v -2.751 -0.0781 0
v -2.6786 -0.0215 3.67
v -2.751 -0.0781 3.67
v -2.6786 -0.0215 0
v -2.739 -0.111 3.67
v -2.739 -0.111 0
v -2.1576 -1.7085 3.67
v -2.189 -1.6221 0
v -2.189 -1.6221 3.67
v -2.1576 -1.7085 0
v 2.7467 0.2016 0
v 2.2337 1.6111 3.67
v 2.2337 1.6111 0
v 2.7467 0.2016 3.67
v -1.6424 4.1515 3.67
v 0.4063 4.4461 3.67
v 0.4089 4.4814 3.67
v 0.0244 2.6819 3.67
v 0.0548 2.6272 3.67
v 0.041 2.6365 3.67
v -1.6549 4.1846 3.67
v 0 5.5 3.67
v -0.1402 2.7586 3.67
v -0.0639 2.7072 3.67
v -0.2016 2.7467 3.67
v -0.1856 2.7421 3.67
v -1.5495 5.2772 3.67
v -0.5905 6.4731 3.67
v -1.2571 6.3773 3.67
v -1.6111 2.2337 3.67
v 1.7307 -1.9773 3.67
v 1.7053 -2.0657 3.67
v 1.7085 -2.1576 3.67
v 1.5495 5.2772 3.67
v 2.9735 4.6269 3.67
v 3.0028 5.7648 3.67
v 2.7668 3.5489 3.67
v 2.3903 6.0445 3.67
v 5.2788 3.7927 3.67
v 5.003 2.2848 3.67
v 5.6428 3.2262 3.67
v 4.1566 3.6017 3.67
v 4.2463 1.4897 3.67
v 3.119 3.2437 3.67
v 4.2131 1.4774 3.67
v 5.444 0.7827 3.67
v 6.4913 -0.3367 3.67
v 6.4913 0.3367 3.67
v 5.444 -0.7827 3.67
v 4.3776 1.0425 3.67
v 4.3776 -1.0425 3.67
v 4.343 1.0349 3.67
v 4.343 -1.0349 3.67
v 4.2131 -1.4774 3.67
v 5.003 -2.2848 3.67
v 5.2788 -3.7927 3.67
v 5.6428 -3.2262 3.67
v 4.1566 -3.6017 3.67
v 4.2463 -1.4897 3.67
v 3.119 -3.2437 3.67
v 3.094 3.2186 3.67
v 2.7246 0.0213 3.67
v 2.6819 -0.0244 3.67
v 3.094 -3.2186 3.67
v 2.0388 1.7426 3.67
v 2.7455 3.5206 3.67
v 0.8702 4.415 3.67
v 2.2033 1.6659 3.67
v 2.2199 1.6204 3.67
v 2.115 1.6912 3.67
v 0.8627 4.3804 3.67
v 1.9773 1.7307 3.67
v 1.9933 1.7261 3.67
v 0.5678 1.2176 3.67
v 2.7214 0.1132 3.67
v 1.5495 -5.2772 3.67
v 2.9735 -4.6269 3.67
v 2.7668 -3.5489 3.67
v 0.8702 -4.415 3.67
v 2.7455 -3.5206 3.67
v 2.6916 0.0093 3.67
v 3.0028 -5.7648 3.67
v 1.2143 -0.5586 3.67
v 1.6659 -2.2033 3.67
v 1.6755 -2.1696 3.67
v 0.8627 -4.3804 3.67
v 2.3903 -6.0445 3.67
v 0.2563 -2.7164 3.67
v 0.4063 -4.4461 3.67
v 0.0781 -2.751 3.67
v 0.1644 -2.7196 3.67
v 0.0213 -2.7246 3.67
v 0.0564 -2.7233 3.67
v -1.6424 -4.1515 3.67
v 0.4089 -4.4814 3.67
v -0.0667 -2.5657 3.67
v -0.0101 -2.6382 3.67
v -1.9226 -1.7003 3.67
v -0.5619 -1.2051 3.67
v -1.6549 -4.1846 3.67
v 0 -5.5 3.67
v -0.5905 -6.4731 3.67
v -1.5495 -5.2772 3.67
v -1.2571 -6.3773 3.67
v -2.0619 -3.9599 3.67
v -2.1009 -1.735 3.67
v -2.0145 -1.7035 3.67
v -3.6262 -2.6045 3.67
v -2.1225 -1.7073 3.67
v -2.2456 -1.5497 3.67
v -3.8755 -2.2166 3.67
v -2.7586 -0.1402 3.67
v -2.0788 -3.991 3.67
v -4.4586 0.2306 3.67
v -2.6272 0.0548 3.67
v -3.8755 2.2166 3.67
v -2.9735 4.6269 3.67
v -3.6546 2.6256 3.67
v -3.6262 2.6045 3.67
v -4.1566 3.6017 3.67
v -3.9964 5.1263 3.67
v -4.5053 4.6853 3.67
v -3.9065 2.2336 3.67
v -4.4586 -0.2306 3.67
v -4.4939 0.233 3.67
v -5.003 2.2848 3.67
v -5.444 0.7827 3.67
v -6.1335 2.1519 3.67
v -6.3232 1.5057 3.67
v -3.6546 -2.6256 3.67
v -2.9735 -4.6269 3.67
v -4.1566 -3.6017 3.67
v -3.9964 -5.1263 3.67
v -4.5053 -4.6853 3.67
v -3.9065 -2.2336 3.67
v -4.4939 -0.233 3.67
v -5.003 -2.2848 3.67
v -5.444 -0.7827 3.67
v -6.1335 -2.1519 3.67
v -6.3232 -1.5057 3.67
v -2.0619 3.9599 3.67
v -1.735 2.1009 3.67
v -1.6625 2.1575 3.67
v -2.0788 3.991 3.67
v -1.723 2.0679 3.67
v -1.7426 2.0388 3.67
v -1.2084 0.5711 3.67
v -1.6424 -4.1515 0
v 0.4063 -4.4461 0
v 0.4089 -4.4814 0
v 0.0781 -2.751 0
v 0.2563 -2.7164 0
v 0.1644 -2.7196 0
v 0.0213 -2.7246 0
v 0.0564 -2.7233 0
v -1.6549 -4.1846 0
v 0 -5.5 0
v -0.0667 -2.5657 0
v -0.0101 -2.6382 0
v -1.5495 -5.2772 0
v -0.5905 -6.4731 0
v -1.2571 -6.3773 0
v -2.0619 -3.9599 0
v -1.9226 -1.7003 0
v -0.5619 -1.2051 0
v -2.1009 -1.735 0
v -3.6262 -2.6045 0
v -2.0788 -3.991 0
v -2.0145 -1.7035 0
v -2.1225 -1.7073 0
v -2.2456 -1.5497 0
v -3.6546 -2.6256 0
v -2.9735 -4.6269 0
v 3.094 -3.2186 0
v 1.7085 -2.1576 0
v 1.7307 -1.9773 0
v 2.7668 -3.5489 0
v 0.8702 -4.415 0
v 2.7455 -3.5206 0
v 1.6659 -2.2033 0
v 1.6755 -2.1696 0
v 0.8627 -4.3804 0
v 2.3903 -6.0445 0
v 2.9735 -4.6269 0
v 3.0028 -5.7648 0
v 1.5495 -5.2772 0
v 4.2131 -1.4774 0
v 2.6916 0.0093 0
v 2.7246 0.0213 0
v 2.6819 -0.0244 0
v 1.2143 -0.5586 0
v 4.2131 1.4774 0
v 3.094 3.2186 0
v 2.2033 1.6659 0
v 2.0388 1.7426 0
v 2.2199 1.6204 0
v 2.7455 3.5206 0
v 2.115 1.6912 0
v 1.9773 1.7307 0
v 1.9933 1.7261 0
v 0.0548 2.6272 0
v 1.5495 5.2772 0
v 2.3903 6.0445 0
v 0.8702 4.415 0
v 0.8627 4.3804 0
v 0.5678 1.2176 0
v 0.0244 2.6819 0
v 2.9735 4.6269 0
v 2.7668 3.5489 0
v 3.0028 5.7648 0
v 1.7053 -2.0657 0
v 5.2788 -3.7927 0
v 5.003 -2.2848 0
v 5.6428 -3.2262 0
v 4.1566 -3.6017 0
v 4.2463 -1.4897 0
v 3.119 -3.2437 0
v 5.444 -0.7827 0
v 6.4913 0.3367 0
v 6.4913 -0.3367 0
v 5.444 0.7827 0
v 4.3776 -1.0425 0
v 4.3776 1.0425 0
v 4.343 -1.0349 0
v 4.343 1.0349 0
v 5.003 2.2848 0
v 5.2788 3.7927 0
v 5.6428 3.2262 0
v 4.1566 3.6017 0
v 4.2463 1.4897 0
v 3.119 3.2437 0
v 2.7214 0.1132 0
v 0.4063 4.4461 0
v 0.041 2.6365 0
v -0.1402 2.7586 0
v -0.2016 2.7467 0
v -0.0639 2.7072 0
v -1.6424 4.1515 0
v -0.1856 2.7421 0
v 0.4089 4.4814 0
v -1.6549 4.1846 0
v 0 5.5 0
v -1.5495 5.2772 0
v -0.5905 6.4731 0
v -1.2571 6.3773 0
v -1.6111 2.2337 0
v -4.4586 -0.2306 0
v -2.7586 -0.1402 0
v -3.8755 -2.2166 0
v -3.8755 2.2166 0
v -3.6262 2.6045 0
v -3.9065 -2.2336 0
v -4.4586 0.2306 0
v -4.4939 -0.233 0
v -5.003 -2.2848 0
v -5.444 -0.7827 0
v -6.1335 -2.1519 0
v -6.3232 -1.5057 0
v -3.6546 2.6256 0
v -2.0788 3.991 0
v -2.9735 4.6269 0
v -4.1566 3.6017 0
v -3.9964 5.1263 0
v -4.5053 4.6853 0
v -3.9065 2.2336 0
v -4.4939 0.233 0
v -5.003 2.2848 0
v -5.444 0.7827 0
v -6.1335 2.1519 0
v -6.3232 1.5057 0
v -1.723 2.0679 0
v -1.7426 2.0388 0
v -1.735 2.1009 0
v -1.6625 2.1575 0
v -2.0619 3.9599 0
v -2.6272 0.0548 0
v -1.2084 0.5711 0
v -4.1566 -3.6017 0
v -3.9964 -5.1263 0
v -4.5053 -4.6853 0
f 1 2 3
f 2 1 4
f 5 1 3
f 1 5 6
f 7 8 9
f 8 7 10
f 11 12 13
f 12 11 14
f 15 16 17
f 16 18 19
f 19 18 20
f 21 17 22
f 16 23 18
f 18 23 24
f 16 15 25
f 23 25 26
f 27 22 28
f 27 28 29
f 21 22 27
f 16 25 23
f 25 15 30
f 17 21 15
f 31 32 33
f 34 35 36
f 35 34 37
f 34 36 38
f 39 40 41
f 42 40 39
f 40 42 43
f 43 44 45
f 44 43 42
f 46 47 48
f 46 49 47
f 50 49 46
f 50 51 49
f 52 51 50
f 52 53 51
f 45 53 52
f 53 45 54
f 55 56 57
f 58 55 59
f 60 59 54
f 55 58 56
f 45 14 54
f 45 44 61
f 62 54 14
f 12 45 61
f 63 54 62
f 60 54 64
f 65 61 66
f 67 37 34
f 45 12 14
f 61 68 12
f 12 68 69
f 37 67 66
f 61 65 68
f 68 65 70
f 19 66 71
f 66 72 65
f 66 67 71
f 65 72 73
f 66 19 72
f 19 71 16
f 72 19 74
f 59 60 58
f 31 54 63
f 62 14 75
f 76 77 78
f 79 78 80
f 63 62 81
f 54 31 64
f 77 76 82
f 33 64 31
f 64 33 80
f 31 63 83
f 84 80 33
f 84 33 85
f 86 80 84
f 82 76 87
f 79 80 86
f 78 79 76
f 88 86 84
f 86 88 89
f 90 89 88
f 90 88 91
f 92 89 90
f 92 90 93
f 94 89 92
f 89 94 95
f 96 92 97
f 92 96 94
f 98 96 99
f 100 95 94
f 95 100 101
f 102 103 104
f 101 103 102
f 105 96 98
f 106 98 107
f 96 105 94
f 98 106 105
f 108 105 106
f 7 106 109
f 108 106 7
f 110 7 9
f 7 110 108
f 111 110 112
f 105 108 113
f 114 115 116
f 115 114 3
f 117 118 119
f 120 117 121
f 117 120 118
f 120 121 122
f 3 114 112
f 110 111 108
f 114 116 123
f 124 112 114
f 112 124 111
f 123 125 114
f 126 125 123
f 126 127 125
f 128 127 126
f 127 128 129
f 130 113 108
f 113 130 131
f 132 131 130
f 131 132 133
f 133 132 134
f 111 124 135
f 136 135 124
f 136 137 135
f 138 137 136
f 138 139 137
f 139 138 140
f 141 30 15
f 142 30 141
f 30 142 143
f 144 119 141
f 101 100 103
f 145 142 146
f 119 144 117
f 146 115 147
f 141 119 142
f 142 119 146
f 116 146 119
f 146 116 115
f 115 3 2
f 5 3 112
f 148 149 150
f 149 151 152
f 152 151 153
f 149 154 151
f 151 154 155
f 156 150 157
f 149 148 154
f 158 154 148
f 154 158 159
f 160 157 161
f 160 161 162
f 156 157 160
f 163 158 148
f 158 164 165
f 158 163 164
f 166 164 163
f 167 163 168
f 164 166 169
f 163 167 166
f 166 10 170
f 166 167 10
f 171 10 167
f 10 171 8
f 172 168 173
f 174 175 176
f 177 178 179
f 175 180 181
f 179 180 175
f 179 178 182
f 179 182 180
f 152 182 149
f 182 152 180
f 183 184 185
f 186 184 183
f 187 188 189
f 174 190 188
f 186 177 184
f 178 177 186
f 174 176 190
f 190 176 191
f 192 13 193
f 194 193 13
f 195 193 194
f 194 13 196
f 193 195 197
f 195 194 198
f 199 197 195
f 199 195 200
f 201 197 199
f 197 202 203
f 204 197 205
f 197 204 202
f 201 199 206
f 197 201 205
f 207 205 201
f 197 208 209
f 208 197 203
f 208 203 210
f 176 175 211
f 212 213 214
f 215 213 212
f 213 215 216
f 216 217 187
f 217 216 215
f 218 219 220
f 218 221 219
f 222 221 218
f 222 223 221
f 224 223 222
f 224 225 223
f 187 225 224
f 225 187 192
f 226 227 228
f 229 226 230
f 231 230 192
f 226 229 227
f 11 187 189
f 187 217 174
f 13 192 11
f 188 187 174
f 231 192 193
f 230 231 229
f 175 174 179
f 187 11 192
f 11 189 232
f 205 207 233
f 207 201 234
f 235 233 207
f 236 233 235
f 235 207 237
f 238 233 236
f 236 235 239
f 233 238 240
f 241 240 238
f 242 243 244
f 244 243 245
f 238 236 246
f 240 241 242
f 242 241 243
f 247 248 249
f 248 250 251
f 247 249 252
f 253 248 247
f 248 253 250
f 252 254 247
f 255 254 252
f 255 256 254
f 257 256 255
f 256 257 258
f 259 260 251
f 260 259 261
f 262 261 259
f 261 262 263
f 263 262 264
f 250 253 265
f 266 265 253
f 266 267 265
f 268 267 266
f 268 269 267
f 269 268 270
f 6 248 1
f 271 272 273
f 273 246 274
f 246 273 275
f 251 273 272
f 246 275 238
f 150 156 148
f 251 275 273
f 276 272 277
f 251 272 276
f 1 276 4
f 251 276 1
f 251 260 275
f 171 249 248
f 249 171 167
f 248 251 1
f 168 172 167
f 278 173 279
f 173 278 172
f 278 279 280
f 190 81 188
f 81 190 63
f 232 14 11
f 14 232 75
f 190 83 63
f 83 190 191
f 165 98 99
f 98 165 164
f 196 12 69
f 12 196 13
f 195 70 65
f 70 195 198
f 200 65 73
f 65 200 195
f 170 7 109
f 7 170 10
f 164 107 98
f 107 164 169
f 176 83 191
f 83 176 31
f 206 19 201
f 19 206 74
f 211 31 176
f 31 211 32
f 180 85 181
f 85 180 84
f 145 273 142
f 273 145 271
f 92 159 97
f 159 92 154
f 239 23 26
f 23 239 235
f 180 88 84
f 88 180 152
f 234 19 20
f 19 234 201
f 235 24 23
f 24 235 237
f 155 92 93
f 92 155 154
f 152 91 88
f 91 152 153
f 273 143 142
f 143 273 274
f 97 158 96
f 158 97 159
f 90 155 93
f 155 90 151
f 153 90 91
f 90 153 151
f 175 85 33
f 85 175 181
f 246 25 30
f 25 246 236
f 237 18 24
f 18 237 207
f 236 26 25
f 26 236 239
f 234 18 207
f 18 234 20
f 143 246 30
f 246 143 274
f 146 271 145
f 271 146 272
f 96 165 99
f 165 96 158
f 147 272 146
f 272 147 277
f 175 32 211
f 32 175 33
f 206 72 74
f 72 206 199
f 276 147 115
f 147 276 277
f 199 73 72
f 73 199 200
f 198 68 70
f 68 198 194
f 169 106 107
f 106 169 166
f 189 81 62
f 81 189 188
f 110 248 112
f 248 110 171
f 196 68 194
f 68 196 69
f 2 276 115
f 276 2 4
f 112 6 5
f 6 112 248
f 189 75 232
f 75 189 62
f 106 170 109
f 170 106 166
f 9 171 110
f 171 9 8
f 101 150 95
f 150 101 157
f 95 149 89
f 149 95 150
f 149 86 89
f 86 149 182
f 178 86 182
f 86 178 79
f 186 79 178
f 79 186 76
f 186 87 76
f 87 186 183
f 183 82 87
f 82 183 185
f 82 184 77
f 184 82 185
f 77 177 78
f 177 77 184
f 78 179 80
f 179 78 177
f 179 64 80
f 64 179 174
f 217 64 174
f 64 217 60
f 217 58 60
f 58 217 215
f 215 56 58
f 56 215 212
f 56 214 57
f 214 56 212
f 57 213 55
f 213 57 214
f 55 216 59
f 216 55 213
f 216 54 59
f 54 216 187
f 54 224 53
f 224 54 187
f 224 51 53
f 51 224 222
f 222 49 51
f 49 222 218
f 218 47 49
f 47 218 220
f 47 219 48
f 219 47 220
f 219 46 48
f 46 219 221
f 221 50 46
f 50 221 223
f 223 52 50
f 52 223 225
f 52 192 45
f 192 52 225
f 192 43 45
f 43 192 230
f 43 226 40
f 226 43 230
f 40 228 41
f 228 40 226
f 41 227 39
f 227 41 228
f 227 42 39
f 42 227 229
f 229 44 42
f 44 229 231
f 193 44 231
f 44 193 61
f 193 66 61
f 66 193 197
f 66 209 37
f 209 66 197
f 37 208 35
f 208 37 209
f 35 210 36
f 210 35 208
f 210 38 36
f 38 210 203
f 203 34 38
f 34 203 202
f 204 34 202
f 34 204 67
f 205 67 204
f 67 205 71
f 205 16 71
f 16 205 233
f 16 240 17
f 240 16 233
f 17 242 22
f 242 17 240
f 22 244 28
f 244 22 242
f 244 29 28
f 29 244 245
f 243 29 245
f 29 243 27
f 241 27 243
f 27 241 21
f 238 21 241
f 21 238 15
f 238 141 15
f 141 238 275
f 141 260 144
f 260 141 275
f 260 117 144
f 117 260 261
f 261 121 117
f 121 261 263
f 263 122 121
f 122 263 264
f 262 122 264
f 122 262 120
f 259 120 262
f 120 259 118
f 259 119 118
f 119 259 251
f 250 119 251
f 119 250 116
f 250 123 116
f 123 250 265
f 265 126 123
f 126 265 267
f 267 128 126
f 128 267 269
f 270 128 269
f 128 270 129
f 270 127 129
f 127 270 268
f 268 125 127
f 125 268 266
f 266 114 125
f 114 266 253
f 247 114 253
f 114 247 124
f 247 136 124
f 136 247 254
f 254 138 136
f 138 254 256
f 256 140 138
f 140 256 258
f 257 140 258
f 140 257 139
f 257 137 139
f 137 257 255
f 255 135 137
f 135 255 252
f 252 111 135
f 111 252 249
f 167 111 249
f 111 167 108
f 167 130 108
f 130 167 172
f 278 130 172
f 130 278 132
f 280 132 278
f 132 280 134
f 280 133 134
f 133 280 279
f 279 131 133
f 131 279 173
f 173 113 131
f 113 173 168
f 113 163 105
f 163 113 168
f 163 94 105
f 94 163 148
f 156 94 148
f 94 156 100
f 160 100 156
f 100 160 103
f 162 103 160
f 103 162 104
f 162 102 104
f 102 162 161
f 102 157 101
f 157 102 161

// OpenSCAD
// Alorithmic LEGO(r) Technic compatible gear generator
//
// NOTE regarding Patents: Since 1977 the LEGO Group has produced "Technic"
// elements with gear teeth, axles, axle-holes, and other features closely
// resembling the design(s) in this file, as part of their "Expert Builder"
// and "Technical Sets", now called "Technic" (see for example set 961,
// peeron.com/inv/sets/961-1?showpic=9288 ). By 1989 they had added pieces
// with rounded ends (see peeron.com/inv/sets/5264-1?showpic=8542 (set 5264
// from 1987) and peeron.com/inv/sets/5110-2?showpic=8543 (set 5110 from 1989))
// The object(s) produced by this SCAD file are different from real LEGO(r)
// elements, and any similarities of features, such as the shapes of axles
// and axle-holes, are functional in nature. The functions in question
// resemble those in LEGO patents that have already expired (or, if not
// patented, became prior art when the product(s) became available for
// purchase, i.e. 1989 at the latest). Nevertheless, one must not infringe
// on non-expired patents and any non-patent rights, such as LEGO(r)
// trademarks and brand identity. An example of such infringement would be
// to make objects and then try to "pass them off" as LEGO products. See
// for example the Kirkbi AG v. Ritvik Holdings Inc. case, (Supreme Court of
// Canada [2005] 3 S.C.R. 302).
//
// This was originally created by user bjepson on Thingiverse (thing 29989),
// then heavily modified and expanded by Robert Munafo:
//  20121226: separate parameters for rows/columns of cylinder holes and of
//            "plus-shaped" holes
//          * Rotate the holes by 20 degrees to take advantage of
//            edge dithering both for improved hole width resolution
//            and to provide a rough surface which better grips the
//            smooth axles.
//          * You can now get more than just a single row of plus-holes
//            in each direction
//
//  20130105: added MCAD functions to make this file work all by itself (no
//            need to hunt down missing pieces elsewhere)
//          * More accurate axle hole dimensions
//          * Round holes are actually round now (imagine that!)
//          * Automatically determines correct parameters for number and placement
//            of holes, based on number of teeth
//
//  20130106: fix small glitch seen at junction of fillet and bottom land (for
//            illustration of the problem, see "0106-fix.jpg" at
//            thingiverse.com/thing:40410)

// 32 teeth is the real "missing" gear size, because all the other
// multiples of 8 are available. An argument can also be made for 28 (which
// however is available in the new small turntable) or any other multiple of 4
// because the official gears are all multiples of 4, namely: 8, 12, 16,
// 20, 24, 28(turntable), 36, 40 and 56(big turntable).
//
// For my orrery designs ( see mrob.com/orrery ) I might use any integer
// number of teeth from 8 up to around 60 or 70.
//
// The holes parameters need to be chosen a certain way. To get a normal style
// gear with a + hole in the middle, the plus_row and plus_col should both
// be odd, and the holes_row, holes_col should both be even. To get a round
// hole in the center, do it the other way 'round. Then invoke it as
// myGearParamed(n_teeth, holes_row, holes_col, plus_row, plus_col)
//
// Examples:
//          my 20 gear: holes_row=2, holes_col=2, plus_row=1, plus_col=1
//    Standard 24 gear: holes_row=2, holes_col=2, plus_row=1, plus_col=1
//          my 28 gear: holes_row=2, holes_col=2, plus_row=3, plus_col=1
//          my 32 gear: holes_row=2, holes_col=2, plus_row=3, plus_col=3
// nonstandard 36 gear: holes_row=2, holes_col=2, plus_row=3, plus_col=3
//    Standard 40 gear: holes_row=4, holes_col=2, plus_row=3, plus_col=3
//          my 44 gear: holes_row=4, holes_col=2, plus_row=3, plus_col=3
//          my 48 gear: holes_row=4, holes_col=4, plus_row=5, plus_col=3
//
// By default, the myGear function chooses the best values for all the holes paramters
// based on the number of teeth.

// As an example, make one gear.
myGear(11);

module myGear(n_teeth) {
  if (n_teeth >= 56) {
    myGearParamed(n_teeth, 6, 4, 5, 5);
  } else if (n_teeth >= 48) {
    myGearParamed(n_teeth, 4, 4, 5, 3);
  } else if (n_teeth >= 40) {
    myGearParamed(n_teeth, 4, 2, 3, 3);
  } else if (n_teeth >= 32) {
    myGearParamed(n_teeth, 2, 2, 3, 3);
  } else if (n_teeth >= 26) {
    myGearParamed(n_teeth, 2, 2, 3, 1);
  } else if (n_teeth >= 21) {
    myGearParamed(n_teeth, 2, 2, 1, 1);
  } else {
    myGearParamed(n_teeth, 0, 0, 1, 1);
  }
}

module myGearParamed(num_teeth, holes_row, holes_col, plus_row, plus_col)
{
  jaggy_angle = 20;
  beam_width = 7.8;  // Needs to be a bit less than the LEGO stud spacing = 7.99 mm
  gearHeight = 3.67;

  axle_gap = 1.9;   // axle thickness is actually about 1.8 mm
  hole_radius = 2.65;

  difference() {
    linear_extrude(height = gearHeight, center = false, convexity = 10, twist = 0) {
      gear(number_of_teeth=num_teeth,
        diametral_pitch=1, 
        pressure_angle=88, 
        clearance = 0);
    }

    // We do two rectangular grids of holes, rotate 90 degrees and do them
    // again.
    for (i = [jaggy_angle, jaggy_angle+90]) {
      rotate([0,0,i]) {
        // Cut the cross-axle holes (8.0mm = stud spacing)
        if (plus_row > 0) {
          for (x=[-4 * (plus_row - 1 ): 8.0 : 4 * (plus_row -1 )]) {
            for (y=[-4 * (plus_col - 1 ): 8.0 : 4 * (plus_col -1)]) {
              translate([x - hole_radius, y - axle_gap/2, 0])
                #roundedRect([hole_radius * 2, axle_gap, gearHeight], .2);
              translate([x - axle_gap/2, y - hole_radius, 0])
                #roundedRect([axle_gap, hole_radius * 2, gearHeight], .2);
            }
          }
        }

        if (holes_row > 0) {
          // Cut the round holes
          for (x=[-4 * (holes_row-1) : 8.0 : 4 * (holes_row-1)]) {
            for (y=[-4 * (holes_col-1) : 8.0 : 4 * (holes_col-1)]) {
              translate([x, y, 0]) {
                #cylinder(r=hole_radius, h = gearHeight, $fs=0.5);
              }
            }
          }
        }

      }
    }

  }
}


// ---------------------------------------------------------------------------------
//
// module for rounded rectangles by tlrobinson on Thingiverse in a 
// comment posted to http://www.thingiverse.com/thing:9347 on March
// 29, 2012, 3:57:46 AM EDT
//
module roundedRect(size, radius) {  
  x = size[0];  
  y = size[1];  
  z = size[2];  
 
  linear_extrude(height=z)  
  hull() {  
    translate([radius, radius, 0])  
      circle(r=radius);  
 
    translate([x - radius, radius, 0])  
      circle(r=radius);  
 
    translate([x - radius, y - radius, 0])  
      circle(r=radius);  
 
    translate([radius, y - radius, 0])  
      circle(r=radius);  
  }  
}


// ---------------------------------------------------------------------------------
//
// The following functions (gear, involute_gear_tooth and two minor functions)
// are taken from the "gears.scad" file in the "MCAD" package, which is available
// at https://github.com/D1plo1d/MCAD

// Geometry Sources:
//  http://www.cartertools.com/involute.html
//  gears.py (inkscape extension: /usr/share/inkscape/extensions/gears.py)
// Usage:
//  Diametral pitch: Number of teeth per unit length.
//  Circular pitch: Length of the arc from one tooth to the next
//  Clearance: Radial distance between top of tooth on one gear to bottom of gap on another.

module gear(number_of_teeth,
    circular_pitch=false, diametral_pitch=false,
    pressure_angle=20, clearance = 0)
{
  if (circular_pitch==false && diametral_pitch==false) echo("MCAD ERROR: gear module needs either a diametral_pitch or circular_pitch");
  
  //Convert diametrial pitch to our native circular pitch
  circular_pitch = (circular_pitch!=false?circular_pitch:180/diametral_pitch);
  
  // Pitch diameter: Diameter of pitch circle.
  pitch_diameter  =  number_of_teeth * circular_pitch / 180;
  pitch_radius = pitch_diameter/2;
  
  // Base Circle
  base_diameter = pitch_diameter*cos(pressure_angle);
  base_radius = base_diameter/2;

  // Diametrial pitch: Number of teeth per unit length.
  pitch_diametrial = number_of_teeth / pitch_diameter;

  // Addendum: Radial distance from pitch circle to outside circle.
  addendum = 1/pitch_diametrial;
  
  //Outer Circle
  outer_radius = pitch_radius+addendum;
  outer_diameter = outer_radius*2;
  
  // Dedendum: Radial distance from pitch circle to root diameter
  dedendum = addendum + clearance;

  // Root diameter: Diameter of bottom of tooth spaces.
  root_radius = pitch_radius-dedendum;
  root_diameter = root_radius * 2;
  
  half_thick_angle = 360 / (4 * number_of_teeth);
  
  union() {
    rotate(half_thick_angle)
      circle($fn=number_of_teeth*2, r=root_radius*1.001);
    
    for (i= [1:number_of_teeth]) {  //for (i = [0])
      rotate([0,0,i*360/number_of_teeth]) {
        involute_gear_tooth(
          pitch_radius = pitch_radius,
          root_radius = root_radius,
          base_radius = base_radius,
          outer_radius = outer_radius,
          half_thick_angle = half_thick_angle);
      } // end of rotate(){}
    } // end of for(){}
  } // end of union(){}
} // end of module gear

module involute_gear_tooth(
          pitch_radius,
          root_radius,
          base_radius,
          outer_radius,
          half_thick_angle
          )
{
  pitch_to_base_angle  = involute_intersect_angle( base_radius, pitch_radius );
  
  outer_to_base_angle = involute_intersect_angle( base_radius, outer_radius );
  
  base1 = 0 - pitch_to_base_angle - half_thick_angle;
  pitch1 = 0 - half_thick_angle;
  outer1 = outer_to_base_angle - pitch_to_base_angle - half_thick_angle;
  
  b1 = polar_to_cartesian([ base1, base_radius ]);
  p1 = polar_to_cartesian([ pitch1, pitch_radius ]);
  o1 = polar_to_cartesian([ outer1, outer_radius ]);
  
  b2 = polar_to_cartesian([ -base1, base_radius ]);
  p2 = polar_to_cartesian([ -pitch1, pitch_radius ]);
  o2 = polar_to_cartesian([ -outer1, outer_radius ]);
  
  // set up values for ( root_radius > base_radius ) case
    pitch_to_root_angle = pitch_to_base_angle - involute_intersect_angle(base_radius, root_radius );
    root1 = pitch1 - pitch_to_root_angle;
    root2 = -pitch1 + pitch_to_root_angle;
    r1_t =  polar_to_cartesian([ root1, root_radius ]);
    r2_t =  polar_to_cartesian([ -root1, root_radius ]);
  
  // set up values for ( else ) case
    r1_f =  polar_to_cartesian([ base1, root_radius ]);
    r2_f =  polar_to_cartesian([ -base1, root_radius ]);
  
  if (root_radius > base_radius) {
    polygon( points = [
      b1, r1_t,p1,o1,o2,p2,r2_t, b2
    ], convexity = 3);
  } else {
    polygon( points = [
      r1_f, b1,p1,o1,o2,p2,b2,r2_f
    ], convexity = 3);
  }
  
}

// Mathematical Functions
//===============

// Finds the angle of the involute about the base radius at the given distance (radius) from its center.
//source: http://www.mathhelpforum.com/math-help/geometry/136011-circle-involute-solving-y-any-given-x.html

function involute_intersect_angle(base_radius, radius) = sqrt( pow(radius/base_radius,2) - 1);



// Polar coord [angle, radius] to cartesian coord [x,y]

function polar_to_cartesian(polar) = [
  polar[1]*cos(polar[0]),
  polar[1]*sin(polar[0])
];
